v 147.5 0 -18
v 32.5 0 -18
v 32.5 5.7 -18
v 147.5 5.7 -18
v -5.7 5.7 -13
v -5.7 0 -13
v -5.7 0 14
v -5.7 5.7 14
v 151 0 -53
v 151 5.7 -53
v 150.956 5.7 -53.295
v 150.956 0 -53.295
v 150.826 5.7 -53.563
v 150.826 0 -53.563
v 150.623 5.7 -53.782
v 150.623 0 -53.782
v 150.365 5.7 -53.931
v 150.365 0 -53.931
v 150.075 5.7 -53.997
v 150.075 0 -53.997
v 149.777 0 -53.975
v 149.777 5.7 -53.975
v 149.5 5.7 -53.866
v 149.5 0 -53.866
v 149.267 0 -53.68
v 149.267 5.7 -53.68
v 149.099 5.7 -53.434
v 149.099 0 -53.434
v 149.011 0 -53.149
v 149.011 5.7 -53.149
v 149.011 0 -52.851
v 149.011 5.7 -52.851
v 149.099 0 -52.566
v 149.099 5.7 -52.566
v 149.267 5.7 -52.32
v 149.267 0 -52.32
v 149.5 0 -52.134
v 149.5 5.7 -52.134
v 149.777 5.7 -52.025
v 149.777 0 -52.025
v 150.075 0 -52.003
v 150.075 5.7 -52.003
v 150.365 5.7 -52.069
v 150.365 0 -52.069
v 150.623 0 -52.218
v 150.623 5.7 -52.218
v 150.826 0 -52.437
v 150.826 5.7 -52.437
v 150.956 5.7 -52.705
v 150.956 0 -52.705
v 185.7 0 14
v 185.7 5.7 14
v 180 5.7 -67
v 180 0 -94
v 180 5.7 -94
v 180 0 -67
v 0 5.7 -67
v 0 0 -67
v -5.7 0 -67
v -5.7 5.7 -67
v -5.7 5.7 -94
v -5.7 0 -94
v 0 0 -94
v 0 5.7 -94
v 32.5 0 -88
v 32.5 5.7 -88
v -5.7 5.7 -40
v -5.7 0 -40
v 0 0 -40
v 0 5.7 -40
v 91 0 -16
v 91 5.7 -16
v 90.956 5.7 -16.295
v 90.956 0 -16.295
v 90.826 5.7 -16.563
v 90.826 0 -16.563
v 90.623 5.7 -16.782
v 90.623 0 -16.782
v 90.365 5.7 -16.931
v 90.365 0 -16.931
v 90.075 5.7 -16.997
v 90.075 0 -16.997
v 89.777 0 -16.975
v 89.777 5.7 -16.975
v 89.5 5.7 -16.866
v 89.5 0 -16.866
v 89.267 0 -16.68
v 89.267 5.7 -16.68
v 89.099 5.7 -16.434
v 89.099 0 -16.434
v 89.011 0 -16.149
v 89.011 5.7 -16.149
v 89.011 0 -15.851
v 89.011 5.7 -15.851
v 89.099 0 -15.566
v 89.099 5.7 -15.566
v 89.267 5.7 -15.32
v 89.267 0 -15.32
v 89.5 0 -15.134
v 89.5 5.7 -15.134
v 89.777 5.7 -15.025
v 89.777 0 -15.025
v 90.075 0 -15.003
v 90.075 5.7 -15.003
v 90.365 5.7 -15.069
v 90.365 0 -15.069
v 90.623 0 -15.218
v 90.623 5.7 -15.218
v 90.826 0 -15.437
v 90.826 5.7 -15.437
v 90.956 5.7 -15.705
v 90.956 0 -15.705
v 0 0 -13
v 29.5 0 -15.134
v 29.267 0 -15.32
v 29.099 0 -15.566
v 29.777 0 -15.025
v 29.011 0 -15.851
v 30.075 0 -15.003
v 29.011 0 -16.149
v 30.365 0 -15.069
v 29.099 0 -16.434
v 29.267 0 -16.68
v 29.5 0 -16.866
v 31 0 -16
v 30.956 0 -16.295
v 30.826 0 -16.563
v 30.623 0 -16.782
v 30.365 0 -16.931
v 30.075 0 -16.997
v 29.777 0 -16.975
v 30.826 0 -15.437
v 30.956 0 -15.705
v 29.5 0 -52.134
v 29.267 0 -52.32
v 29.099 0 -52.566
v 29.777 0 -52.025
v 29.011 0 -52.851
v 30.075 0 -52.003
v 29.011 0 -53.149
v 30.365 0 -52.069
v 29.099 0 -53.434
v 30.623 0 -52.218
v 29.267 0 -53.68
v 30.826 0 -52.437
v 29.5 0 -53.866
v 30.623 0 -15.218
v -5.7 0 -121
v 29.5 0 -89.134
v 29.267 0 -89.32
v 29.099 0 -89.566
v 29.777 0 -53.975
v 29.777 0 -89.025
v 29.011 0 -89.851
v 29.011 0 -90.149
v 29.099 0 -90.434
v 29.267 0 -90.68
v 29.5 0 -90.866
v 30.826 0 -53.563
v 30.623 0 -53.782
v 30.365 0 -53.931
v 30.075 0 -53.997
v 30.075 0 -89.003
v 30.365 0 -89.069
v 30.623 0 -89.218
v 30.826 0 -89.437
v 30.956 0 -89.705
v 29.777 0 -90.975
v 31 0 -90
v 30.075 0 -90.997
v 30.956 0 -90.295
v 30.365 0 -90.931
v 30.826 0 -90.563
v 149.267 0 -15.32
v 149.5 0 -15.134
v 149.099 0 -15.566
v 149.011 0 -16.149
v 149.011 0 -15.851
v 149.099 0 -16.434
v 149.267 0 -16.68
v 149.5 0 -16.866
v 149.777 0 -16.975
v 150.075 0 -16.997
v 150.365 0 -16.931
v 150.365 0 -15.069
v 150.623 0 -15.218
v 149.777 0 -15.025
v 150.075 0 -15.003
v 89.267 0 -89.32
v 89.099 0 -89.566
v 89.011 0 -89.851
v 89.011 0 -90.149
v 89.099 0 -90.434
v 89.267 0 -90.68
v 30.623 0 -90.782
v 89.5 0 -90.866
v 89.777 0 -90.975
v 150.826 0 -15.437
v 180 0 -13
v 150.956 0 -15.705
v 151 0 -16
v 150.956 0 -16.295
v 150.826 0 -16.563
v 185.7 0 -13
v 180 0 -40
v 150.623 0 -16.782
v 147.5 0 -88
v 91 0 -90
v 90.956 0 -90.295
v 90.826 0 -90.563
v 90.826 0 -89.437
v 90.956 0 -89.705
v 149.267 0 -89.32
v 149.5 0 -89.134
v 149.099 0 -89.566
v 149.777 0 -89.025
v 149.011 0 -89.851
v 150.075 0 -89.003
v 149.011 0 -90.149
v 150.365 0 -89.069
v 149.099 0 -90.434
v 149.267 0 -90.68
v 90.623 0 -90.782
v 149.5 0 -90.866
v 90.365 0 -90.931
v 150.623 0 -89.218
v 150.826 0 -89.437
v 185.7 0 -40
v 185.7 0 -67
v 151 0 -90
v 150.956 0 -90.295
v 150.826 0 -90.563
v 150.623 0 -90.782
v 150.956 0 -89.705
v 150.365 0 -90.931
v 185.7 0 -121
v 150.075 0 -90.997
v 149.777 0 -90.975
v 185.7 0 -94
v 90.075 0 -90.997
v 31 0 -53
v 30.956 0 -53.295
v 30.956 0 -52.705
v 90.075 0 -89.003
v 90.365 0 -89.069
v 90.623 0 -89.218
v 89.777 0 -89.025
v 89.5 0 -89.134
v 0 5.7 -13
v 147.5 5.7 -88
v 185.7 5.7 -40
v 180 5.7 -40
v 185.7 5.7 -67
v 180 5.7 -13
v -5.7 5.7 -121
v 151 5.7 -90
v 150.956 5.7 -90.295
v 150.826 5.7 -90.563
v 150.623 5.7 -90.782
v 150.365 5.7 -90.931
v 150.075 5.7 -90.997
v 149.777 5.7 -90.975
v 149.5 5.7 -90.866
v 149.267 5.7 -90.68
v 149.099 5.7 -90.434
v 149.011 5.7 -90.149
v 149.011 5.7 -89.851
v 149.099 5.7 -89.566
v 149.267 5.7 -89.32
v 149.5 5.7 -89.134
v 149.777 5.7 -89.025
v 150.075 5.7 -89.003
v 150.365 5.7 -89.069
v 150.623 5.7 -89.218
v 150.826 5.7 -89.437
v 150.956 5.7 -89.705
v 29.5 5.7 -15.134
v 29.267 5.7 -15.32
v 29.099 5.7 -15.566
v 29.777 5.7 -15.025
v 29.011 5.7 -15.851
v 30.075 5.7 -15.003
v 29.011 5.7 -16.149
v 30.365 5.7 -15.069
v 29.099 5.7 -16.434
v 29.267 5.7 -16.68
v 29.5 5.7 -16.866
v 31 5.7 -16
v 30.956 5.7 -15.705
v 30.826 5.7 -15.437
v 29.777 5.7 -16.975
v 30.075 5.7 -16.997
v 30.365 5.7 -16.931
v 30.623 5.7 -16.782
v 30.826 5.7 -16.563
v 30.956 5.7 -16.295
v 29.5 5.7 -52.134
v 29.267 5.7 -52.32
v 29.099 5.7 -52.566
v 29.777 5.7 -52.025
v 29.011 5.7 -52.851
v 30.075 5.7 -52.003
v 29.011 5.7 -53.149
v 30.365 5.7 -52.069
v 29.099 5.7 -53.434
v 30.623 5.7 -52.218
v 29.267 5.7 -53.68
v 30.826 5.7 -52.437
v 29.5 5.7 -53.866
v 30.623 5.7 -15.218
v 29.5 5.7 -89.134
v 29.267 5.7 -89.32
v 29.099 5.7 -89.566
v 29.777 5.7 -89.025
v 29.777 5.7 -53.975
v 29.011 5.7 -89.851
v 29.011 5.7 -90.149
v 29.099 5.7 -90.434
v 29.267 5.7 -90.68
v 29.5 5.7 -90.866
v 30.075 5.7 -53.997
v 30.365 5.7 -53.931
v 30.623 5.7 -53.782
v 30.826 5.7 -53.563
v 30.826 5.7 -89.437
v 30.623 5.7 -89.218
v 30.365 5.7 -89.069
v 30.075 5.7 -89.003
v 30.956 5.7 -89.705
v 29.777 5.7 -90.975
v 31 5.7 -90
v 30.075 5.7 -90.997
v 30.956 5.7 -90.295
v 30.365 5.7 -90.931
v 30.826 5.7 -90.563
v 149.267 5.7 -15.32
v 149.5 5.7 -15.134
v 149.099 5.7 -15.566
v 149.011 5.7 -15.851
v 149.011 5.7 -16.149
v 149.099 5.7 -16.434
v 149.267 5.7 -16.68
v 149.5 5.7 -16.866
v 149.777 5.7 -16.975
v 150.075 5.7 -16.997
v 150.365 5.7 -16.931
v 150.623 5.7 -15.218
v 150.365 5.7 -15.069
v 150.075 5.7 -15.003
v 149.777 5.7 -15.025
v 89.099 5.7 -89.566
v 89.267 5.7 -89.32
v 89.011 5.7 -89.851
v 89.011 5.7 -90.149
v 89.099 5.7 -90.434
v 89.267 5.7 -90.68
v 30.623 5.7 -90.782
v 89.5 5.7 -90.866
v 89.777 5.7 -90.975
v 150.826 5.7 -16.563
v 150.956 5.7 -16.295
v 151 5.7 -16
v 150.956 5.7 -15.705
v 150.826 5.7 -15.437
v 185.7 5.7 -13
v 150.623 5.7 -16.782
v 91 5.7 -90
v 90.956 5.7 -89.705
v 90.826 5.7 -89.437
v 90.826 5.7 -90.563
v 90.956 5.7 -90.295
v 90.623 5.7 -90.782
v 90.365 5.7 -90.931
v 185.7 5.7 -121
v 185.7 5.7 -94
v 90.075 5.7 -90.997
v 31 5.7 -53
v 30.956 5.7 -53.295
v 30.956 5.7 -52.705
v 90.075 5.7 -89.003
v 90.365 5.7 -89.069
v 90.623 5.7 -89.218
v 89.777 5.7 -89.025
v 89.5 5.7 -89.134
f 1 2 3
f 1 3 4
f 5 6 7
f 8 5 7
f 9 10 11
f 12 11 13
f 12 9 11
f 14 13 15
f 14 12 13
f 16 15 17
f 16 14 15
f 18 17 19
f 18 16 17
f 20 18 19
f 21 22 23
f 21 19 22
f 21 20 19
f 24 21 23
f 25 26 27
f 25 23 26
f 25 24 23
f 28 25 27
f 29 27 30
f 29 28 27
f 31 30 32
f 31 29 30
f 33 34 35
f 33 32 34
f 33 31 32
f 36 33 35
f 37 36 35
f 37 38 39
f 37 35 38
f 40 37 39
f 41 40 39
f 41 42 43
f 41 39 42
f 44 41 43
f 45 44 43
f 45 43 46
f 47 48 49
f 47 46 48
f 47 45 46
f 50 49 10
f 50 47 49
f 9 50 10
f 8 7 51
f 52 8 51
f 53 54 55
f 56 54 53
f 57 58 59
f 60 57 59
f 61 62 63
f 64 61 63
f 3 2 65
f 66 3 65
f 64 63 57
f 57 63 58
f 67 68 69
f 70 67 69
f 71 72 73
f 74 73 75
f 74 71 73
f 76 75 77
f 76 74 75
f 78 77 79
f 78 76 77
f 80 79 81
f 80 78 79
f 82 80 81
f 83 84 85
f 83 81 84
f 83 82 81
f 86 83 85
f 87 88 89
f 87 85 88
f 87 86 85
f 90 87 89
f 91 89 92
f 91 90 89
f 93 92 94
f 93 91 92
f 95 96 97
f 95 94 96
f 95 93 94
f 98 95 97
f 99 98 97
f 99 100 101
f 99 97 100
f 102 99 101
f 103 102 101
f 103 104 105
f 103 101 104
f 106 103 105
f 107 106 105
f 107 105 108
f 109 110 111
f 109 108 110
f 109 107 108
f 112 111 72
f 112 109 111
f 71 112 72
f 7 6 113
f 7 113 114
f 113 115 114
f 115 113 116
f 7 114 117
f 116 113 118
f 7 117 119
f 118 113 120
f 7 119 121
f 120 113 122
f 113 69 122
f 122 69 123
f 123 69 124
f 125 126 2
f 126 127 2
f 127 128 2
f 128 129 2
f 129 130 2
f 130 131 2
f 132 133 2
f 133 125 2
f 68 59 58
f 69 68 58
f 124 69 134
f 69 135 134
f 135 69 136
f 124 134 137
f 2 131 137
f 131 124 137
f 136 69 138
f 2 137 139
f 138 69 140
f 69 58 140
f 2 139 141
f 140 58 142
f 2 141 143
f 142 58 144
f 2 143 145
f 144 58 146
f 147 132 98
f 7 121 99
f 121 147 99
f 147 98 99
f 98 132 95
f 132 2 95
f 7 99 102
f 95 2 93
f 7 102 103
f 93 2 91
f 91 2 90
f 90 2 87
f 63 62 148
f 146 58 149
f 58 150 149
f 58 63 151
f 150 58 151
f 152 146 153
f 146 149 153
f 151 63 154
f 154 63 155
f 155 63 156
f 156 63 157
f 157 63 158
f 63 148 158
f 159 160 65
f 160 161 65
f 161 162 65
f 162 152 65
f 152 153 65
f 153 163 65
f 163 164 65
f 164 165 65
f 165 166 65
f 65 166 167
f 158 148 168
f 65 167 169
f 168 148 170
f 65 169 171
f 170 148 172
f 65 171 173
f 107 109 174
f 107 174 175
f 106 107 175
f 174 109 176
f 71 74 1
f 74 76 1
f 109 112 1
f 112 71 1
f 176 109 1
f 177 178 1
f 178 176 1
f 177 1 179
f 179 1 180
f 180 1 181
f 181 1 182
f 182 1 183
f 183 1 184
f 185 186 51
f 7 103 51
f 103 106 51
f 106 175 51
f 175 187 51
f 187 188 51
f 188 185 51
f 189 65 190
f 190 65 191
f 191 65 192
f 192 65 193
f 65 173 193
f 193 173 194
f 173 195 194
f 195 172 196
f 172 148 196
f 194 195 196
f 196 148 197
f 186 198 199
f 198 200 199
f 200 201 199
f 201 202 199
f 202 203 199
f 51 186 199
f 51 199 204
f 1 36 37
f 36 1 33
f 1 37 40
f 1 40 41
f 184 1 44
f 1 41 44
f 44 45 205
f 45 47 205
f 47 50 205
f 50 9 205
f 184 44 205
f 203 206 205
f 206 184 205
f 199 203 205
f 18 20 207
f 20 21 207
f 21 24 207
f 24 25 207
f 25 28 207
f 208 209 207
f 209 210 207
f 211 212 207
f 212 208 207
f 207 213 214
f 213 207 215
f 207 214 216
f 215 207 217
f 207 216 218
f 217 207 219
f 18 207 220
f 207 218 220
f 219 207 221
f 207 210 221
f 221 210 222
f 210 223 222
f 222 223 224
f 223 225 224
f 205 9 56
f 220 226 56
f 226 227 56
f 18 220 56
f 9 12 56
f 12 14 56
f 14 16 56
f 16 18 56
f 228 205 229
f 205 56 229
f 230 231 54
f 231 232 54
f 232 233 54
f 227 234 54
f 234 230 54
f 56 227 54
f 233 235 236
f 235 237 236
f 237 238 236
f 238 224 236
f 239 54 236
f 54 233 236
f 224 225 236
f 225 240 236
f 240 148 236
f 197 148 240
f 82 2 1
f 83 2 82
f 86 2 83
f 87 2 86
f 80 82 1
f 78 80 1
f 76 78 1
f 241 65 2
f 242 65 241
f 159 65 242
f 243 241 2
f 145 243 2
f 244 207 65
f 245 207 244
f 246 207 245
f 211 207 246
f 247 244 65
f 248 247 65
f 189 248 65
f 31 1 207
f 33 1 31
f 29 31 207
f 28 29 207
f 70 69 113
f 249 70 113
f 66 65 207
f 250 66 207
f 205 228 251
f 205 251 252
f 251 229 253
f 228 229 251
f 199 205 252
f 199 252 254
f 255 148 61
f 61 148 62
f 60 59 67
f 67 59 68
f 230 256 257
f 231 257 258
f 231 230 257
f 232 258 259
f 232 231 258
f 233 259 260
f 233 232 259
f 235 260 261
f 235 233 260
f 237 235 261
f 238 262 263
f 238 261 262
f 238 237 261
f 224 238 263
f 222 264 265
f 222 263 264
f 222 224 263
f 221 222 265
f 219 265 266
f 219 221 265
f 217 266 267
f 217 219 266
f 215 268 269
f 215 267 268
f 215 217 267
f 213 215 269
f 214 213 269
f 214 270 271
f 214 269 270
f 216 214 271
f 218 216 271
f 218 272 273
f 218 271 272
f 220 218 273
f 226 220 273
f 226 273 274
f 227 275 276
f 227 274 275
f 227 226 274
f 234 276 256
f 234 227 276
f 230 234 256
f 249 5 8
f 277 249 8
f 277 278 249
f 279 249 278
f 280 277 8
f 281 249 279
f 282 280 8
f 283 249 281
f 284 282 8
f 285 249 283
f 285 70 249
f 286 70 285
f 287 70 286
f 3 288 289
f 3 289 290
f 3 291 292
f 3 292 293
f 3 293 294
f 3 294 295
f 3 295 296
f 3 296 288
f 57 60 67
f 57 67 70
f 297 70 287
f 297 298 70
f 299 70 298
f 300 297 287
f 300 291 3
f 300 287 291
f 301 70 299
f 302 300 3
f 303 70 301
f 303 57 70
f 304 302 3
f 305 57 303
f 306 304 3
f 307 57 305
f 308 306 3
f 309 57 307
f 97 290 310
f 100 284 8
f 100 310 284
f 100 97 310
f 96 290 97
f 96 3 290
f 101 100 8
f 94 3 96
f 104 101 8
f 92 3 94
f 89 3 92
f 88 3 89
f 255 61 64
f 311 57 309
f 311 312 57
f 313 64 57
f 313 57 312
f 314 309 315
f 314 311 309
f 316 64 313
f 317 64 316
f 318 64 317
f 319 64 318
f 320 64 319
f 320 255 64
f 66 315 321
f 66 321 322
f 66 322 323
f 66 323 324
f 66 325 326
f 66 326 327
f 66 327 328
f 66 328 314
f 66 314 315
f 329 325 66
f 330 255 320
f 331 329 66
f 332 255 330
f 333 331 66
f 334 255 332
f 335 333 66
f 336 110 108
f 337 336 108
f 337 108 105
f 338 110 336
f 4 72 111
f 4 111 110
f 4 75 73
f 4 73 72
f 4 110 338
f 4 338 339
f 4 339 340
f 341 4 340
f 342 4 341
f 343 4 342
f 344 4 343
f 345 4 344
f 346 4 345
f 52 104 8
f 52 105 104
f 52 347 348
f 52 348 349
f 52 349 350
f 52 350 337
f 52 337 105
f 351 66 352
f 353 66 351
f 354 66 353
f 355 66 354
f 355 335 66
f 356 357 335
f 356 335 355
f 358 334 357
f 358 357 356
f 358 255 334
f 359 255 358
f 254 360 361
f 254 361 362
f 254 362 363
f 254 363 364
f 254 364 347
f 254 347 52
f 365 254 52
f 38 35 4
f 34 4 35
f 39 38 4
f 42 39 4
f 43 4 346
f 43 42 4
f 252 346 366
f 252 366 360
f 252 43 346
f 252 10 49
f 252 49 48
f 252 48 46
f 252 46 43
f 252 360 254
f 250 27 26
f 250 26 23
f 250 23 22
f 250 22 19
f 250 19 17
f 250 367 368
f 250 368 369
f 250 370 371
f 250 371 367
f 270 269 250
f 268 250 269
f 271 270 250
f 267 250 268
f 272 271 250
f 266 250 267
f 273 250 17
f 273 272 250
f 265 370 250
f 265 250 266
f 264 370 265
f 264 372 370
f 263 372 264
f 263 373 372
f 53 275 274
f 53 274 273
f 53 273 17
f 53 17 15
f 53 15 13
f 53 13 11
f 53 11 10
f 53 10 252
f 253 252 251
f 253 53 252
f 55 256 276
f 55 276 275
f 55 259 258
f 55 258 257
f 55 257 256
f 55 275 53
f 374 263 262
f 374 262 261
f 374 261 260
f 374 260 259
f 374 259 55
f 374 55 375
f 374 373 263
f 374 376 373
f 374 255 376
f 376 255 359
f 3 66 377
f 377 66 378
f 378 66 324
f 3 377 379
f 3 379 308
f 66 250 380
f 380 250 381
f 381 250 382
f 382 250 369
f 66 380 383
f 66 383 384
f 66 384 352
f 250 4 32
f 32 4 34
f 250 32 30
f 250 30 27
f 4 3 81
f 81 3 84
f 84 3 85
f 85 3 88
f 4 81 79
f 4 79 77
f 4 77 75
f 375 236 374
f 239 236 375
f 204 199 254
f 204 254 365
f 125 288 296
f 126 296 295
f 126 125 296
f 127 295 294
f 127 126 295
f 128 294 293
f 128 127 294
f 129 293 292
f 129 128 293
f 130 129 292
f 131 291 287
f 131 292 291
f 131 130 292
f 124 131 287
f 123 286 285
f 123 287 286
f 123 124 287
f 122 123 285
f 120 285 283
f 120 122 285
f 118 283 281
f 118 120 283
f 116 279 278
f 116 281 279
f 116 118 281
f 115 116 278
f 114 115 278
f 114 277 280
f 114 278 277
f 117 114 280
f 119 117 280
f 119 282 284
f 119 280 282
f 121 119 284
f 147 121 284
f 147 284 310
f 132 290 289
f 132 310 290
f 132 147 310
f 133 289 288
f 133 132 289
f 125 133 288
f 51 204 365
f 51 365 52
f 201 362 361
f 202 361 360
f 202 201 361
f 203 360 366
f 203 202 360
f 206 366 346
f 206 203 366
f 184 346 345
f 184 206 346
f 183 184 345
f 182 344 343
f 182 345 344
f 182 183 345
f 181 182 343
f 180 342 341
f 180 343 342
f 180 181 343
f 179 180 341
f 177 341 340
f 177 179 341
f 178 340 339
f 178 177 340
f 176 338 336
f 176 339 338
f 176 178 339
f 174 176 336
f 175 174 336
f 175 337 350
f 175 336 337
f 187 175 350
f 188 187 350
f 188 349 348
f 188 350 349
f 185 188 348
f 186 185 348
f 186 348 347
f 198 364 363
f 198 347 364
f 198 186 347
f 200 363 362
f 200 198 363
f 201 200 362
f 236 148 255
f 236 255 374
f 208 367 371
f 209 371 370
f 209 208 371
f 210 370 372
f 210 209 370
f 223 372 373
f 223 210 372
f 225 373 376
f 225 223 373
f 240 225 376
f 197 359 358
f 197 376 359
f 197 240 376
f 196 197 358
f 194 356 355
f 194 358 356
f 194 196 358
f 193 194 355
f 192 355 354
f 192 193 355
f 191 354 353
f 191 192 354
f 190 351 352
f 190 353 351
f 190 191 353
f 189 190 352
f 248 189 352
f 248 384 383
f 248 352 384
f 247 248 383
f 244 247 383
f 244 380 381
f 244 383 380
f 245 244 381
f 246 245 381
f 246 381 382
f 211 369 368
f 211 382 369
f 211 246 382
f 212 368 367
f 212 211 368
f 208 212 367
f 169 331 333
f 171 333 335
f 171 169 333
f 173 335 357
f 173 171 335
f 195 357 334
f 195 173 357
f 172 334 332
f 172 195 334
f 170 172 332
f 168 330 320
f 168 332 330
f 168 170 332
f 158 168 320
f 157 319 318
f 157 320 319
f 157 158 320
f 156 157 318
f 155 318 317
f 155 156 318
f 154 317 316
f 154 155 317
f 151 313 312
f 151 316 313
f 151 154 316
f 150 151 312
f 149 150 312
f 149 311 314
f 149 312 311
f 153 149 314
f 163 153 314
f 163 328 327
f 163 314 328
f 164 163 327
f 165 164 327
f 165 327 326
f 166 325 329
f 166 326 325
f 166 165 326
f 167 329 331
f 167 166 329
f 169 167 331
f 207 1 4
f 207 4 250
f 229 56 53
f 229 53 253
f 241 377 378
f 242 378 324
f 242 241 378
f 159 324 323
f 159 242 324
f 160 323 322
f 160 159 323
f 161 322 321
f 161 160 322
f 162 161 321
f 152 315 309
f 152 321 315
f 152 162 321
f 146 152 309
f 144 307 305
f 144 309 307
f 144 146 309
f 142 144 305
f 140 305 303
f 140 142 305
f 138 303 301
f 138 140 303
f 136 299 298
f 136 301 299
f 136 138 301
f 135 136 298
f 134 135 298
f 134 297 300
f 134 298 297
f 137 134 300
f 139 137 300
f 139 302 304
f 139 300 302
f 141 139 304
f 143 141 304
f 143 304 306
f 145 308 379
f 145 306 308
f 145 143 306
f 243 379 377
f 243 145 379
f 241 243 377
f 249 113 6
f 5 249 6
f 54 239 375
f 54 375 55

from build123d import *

# Parameters (mm, degrees)
SKETCH3_W           = 192
SKETCH3_H           = 135
BOSS_EXTRUDE1_DEPTH = 5.7
SKETCH9_W           = 115
SKETCH9_H           = 70
CUT_EXTRUDE2_DEPTH  = 47
SKETCH12_R          = 1
CUT_EXTRUDE3_DEPTH  = 37
CUT_EXTRUDE4_DEPTH  = 11


with BuildPart() as part:
    # Sketch3 → Boss-Extrude1 (new body)
    with BuildSketch(Plane(origin=(0, 0, 0), x_dir=(1, 0, 0), z_dir=(0, 1, 0))):
        with Locations((90, 53.5)):
            Rectangle(SKETCH3_W, SKETCH3_H)
    extrude(amount=BOSS_EXTRUDE1_DEPTH)

    # Sketch9 → Cut-Extrude2 (cut)
    with BuildSketch(Plane(origin=(0, 0, 0), x_dir=(1, 0, 0), z_dir=(0, 1, 0))):
        with Locations((90, 53)):
            Rectangle(SKETCH9_W, SKETCH9_H)
    extrude(amount=CUT_EXTRUDE2_DEPTH, mode=Mode.SUBTRACT)

    # Sketch12 → Cut-Extrude3 (cut)
    with BuildSketch(Plane(origin=(0, 0, 0), x_dir=(1, 0, 0), z_dir=(0, 1, 0))):
        with Locations((30, 90)):
            Circle(SKETCH12_R)
        with Locations((30, 53)):
            Circle(SKETCH12_R)
        with Locations((30, 16)):
            Circle(SKETCH12_R)
        with Locations((90, 16)):
            Circle(SKETCH12_R)
        with Locations((150, 16)):
            Circle(SKETCH12_R)
        with Locations((150, 53)):
            Circle(SKETCH12_R)
        with Locations((150, 90)):
            Circle(SKETCH12_R)
        with Locations((90, 90)):
            Circle(SKETCH12_R)
    extrude(amount=CUT_EXTRUDE3_DEPTH, mode=Mode.SUBTRACT)

    # Sketch13 → Cut-Extrude4 (cut)
    with BuildSketch(Plane(origin=(0, 0, 0), x_dir=(1, 0, 0), z_dir=(0, 1, 0))):
        Polygon((-5.7, 121), (-5.7, 94), (0, 94), (0, 67), (-5.7, 67), (-5.7, 40), (0, 40), (0, 13), (-5.7, 13), (-5.7, -14), (-9.7, -14), (-9.7, 121), align=None)
        Polygon((189.7, 121), (185.7, 121), (185.7, 94), (180, 94), (180, 67), (185.7, 67), (185.7, 40), (180, 40), (180, 13), (185.7, 13), (185.7, -14), (189.7, -14), align=None)
    extrude(amount=CUT_EXTRUDE4_DEPTH, mode=Mode.SUBTRACT)


solid = part.part
